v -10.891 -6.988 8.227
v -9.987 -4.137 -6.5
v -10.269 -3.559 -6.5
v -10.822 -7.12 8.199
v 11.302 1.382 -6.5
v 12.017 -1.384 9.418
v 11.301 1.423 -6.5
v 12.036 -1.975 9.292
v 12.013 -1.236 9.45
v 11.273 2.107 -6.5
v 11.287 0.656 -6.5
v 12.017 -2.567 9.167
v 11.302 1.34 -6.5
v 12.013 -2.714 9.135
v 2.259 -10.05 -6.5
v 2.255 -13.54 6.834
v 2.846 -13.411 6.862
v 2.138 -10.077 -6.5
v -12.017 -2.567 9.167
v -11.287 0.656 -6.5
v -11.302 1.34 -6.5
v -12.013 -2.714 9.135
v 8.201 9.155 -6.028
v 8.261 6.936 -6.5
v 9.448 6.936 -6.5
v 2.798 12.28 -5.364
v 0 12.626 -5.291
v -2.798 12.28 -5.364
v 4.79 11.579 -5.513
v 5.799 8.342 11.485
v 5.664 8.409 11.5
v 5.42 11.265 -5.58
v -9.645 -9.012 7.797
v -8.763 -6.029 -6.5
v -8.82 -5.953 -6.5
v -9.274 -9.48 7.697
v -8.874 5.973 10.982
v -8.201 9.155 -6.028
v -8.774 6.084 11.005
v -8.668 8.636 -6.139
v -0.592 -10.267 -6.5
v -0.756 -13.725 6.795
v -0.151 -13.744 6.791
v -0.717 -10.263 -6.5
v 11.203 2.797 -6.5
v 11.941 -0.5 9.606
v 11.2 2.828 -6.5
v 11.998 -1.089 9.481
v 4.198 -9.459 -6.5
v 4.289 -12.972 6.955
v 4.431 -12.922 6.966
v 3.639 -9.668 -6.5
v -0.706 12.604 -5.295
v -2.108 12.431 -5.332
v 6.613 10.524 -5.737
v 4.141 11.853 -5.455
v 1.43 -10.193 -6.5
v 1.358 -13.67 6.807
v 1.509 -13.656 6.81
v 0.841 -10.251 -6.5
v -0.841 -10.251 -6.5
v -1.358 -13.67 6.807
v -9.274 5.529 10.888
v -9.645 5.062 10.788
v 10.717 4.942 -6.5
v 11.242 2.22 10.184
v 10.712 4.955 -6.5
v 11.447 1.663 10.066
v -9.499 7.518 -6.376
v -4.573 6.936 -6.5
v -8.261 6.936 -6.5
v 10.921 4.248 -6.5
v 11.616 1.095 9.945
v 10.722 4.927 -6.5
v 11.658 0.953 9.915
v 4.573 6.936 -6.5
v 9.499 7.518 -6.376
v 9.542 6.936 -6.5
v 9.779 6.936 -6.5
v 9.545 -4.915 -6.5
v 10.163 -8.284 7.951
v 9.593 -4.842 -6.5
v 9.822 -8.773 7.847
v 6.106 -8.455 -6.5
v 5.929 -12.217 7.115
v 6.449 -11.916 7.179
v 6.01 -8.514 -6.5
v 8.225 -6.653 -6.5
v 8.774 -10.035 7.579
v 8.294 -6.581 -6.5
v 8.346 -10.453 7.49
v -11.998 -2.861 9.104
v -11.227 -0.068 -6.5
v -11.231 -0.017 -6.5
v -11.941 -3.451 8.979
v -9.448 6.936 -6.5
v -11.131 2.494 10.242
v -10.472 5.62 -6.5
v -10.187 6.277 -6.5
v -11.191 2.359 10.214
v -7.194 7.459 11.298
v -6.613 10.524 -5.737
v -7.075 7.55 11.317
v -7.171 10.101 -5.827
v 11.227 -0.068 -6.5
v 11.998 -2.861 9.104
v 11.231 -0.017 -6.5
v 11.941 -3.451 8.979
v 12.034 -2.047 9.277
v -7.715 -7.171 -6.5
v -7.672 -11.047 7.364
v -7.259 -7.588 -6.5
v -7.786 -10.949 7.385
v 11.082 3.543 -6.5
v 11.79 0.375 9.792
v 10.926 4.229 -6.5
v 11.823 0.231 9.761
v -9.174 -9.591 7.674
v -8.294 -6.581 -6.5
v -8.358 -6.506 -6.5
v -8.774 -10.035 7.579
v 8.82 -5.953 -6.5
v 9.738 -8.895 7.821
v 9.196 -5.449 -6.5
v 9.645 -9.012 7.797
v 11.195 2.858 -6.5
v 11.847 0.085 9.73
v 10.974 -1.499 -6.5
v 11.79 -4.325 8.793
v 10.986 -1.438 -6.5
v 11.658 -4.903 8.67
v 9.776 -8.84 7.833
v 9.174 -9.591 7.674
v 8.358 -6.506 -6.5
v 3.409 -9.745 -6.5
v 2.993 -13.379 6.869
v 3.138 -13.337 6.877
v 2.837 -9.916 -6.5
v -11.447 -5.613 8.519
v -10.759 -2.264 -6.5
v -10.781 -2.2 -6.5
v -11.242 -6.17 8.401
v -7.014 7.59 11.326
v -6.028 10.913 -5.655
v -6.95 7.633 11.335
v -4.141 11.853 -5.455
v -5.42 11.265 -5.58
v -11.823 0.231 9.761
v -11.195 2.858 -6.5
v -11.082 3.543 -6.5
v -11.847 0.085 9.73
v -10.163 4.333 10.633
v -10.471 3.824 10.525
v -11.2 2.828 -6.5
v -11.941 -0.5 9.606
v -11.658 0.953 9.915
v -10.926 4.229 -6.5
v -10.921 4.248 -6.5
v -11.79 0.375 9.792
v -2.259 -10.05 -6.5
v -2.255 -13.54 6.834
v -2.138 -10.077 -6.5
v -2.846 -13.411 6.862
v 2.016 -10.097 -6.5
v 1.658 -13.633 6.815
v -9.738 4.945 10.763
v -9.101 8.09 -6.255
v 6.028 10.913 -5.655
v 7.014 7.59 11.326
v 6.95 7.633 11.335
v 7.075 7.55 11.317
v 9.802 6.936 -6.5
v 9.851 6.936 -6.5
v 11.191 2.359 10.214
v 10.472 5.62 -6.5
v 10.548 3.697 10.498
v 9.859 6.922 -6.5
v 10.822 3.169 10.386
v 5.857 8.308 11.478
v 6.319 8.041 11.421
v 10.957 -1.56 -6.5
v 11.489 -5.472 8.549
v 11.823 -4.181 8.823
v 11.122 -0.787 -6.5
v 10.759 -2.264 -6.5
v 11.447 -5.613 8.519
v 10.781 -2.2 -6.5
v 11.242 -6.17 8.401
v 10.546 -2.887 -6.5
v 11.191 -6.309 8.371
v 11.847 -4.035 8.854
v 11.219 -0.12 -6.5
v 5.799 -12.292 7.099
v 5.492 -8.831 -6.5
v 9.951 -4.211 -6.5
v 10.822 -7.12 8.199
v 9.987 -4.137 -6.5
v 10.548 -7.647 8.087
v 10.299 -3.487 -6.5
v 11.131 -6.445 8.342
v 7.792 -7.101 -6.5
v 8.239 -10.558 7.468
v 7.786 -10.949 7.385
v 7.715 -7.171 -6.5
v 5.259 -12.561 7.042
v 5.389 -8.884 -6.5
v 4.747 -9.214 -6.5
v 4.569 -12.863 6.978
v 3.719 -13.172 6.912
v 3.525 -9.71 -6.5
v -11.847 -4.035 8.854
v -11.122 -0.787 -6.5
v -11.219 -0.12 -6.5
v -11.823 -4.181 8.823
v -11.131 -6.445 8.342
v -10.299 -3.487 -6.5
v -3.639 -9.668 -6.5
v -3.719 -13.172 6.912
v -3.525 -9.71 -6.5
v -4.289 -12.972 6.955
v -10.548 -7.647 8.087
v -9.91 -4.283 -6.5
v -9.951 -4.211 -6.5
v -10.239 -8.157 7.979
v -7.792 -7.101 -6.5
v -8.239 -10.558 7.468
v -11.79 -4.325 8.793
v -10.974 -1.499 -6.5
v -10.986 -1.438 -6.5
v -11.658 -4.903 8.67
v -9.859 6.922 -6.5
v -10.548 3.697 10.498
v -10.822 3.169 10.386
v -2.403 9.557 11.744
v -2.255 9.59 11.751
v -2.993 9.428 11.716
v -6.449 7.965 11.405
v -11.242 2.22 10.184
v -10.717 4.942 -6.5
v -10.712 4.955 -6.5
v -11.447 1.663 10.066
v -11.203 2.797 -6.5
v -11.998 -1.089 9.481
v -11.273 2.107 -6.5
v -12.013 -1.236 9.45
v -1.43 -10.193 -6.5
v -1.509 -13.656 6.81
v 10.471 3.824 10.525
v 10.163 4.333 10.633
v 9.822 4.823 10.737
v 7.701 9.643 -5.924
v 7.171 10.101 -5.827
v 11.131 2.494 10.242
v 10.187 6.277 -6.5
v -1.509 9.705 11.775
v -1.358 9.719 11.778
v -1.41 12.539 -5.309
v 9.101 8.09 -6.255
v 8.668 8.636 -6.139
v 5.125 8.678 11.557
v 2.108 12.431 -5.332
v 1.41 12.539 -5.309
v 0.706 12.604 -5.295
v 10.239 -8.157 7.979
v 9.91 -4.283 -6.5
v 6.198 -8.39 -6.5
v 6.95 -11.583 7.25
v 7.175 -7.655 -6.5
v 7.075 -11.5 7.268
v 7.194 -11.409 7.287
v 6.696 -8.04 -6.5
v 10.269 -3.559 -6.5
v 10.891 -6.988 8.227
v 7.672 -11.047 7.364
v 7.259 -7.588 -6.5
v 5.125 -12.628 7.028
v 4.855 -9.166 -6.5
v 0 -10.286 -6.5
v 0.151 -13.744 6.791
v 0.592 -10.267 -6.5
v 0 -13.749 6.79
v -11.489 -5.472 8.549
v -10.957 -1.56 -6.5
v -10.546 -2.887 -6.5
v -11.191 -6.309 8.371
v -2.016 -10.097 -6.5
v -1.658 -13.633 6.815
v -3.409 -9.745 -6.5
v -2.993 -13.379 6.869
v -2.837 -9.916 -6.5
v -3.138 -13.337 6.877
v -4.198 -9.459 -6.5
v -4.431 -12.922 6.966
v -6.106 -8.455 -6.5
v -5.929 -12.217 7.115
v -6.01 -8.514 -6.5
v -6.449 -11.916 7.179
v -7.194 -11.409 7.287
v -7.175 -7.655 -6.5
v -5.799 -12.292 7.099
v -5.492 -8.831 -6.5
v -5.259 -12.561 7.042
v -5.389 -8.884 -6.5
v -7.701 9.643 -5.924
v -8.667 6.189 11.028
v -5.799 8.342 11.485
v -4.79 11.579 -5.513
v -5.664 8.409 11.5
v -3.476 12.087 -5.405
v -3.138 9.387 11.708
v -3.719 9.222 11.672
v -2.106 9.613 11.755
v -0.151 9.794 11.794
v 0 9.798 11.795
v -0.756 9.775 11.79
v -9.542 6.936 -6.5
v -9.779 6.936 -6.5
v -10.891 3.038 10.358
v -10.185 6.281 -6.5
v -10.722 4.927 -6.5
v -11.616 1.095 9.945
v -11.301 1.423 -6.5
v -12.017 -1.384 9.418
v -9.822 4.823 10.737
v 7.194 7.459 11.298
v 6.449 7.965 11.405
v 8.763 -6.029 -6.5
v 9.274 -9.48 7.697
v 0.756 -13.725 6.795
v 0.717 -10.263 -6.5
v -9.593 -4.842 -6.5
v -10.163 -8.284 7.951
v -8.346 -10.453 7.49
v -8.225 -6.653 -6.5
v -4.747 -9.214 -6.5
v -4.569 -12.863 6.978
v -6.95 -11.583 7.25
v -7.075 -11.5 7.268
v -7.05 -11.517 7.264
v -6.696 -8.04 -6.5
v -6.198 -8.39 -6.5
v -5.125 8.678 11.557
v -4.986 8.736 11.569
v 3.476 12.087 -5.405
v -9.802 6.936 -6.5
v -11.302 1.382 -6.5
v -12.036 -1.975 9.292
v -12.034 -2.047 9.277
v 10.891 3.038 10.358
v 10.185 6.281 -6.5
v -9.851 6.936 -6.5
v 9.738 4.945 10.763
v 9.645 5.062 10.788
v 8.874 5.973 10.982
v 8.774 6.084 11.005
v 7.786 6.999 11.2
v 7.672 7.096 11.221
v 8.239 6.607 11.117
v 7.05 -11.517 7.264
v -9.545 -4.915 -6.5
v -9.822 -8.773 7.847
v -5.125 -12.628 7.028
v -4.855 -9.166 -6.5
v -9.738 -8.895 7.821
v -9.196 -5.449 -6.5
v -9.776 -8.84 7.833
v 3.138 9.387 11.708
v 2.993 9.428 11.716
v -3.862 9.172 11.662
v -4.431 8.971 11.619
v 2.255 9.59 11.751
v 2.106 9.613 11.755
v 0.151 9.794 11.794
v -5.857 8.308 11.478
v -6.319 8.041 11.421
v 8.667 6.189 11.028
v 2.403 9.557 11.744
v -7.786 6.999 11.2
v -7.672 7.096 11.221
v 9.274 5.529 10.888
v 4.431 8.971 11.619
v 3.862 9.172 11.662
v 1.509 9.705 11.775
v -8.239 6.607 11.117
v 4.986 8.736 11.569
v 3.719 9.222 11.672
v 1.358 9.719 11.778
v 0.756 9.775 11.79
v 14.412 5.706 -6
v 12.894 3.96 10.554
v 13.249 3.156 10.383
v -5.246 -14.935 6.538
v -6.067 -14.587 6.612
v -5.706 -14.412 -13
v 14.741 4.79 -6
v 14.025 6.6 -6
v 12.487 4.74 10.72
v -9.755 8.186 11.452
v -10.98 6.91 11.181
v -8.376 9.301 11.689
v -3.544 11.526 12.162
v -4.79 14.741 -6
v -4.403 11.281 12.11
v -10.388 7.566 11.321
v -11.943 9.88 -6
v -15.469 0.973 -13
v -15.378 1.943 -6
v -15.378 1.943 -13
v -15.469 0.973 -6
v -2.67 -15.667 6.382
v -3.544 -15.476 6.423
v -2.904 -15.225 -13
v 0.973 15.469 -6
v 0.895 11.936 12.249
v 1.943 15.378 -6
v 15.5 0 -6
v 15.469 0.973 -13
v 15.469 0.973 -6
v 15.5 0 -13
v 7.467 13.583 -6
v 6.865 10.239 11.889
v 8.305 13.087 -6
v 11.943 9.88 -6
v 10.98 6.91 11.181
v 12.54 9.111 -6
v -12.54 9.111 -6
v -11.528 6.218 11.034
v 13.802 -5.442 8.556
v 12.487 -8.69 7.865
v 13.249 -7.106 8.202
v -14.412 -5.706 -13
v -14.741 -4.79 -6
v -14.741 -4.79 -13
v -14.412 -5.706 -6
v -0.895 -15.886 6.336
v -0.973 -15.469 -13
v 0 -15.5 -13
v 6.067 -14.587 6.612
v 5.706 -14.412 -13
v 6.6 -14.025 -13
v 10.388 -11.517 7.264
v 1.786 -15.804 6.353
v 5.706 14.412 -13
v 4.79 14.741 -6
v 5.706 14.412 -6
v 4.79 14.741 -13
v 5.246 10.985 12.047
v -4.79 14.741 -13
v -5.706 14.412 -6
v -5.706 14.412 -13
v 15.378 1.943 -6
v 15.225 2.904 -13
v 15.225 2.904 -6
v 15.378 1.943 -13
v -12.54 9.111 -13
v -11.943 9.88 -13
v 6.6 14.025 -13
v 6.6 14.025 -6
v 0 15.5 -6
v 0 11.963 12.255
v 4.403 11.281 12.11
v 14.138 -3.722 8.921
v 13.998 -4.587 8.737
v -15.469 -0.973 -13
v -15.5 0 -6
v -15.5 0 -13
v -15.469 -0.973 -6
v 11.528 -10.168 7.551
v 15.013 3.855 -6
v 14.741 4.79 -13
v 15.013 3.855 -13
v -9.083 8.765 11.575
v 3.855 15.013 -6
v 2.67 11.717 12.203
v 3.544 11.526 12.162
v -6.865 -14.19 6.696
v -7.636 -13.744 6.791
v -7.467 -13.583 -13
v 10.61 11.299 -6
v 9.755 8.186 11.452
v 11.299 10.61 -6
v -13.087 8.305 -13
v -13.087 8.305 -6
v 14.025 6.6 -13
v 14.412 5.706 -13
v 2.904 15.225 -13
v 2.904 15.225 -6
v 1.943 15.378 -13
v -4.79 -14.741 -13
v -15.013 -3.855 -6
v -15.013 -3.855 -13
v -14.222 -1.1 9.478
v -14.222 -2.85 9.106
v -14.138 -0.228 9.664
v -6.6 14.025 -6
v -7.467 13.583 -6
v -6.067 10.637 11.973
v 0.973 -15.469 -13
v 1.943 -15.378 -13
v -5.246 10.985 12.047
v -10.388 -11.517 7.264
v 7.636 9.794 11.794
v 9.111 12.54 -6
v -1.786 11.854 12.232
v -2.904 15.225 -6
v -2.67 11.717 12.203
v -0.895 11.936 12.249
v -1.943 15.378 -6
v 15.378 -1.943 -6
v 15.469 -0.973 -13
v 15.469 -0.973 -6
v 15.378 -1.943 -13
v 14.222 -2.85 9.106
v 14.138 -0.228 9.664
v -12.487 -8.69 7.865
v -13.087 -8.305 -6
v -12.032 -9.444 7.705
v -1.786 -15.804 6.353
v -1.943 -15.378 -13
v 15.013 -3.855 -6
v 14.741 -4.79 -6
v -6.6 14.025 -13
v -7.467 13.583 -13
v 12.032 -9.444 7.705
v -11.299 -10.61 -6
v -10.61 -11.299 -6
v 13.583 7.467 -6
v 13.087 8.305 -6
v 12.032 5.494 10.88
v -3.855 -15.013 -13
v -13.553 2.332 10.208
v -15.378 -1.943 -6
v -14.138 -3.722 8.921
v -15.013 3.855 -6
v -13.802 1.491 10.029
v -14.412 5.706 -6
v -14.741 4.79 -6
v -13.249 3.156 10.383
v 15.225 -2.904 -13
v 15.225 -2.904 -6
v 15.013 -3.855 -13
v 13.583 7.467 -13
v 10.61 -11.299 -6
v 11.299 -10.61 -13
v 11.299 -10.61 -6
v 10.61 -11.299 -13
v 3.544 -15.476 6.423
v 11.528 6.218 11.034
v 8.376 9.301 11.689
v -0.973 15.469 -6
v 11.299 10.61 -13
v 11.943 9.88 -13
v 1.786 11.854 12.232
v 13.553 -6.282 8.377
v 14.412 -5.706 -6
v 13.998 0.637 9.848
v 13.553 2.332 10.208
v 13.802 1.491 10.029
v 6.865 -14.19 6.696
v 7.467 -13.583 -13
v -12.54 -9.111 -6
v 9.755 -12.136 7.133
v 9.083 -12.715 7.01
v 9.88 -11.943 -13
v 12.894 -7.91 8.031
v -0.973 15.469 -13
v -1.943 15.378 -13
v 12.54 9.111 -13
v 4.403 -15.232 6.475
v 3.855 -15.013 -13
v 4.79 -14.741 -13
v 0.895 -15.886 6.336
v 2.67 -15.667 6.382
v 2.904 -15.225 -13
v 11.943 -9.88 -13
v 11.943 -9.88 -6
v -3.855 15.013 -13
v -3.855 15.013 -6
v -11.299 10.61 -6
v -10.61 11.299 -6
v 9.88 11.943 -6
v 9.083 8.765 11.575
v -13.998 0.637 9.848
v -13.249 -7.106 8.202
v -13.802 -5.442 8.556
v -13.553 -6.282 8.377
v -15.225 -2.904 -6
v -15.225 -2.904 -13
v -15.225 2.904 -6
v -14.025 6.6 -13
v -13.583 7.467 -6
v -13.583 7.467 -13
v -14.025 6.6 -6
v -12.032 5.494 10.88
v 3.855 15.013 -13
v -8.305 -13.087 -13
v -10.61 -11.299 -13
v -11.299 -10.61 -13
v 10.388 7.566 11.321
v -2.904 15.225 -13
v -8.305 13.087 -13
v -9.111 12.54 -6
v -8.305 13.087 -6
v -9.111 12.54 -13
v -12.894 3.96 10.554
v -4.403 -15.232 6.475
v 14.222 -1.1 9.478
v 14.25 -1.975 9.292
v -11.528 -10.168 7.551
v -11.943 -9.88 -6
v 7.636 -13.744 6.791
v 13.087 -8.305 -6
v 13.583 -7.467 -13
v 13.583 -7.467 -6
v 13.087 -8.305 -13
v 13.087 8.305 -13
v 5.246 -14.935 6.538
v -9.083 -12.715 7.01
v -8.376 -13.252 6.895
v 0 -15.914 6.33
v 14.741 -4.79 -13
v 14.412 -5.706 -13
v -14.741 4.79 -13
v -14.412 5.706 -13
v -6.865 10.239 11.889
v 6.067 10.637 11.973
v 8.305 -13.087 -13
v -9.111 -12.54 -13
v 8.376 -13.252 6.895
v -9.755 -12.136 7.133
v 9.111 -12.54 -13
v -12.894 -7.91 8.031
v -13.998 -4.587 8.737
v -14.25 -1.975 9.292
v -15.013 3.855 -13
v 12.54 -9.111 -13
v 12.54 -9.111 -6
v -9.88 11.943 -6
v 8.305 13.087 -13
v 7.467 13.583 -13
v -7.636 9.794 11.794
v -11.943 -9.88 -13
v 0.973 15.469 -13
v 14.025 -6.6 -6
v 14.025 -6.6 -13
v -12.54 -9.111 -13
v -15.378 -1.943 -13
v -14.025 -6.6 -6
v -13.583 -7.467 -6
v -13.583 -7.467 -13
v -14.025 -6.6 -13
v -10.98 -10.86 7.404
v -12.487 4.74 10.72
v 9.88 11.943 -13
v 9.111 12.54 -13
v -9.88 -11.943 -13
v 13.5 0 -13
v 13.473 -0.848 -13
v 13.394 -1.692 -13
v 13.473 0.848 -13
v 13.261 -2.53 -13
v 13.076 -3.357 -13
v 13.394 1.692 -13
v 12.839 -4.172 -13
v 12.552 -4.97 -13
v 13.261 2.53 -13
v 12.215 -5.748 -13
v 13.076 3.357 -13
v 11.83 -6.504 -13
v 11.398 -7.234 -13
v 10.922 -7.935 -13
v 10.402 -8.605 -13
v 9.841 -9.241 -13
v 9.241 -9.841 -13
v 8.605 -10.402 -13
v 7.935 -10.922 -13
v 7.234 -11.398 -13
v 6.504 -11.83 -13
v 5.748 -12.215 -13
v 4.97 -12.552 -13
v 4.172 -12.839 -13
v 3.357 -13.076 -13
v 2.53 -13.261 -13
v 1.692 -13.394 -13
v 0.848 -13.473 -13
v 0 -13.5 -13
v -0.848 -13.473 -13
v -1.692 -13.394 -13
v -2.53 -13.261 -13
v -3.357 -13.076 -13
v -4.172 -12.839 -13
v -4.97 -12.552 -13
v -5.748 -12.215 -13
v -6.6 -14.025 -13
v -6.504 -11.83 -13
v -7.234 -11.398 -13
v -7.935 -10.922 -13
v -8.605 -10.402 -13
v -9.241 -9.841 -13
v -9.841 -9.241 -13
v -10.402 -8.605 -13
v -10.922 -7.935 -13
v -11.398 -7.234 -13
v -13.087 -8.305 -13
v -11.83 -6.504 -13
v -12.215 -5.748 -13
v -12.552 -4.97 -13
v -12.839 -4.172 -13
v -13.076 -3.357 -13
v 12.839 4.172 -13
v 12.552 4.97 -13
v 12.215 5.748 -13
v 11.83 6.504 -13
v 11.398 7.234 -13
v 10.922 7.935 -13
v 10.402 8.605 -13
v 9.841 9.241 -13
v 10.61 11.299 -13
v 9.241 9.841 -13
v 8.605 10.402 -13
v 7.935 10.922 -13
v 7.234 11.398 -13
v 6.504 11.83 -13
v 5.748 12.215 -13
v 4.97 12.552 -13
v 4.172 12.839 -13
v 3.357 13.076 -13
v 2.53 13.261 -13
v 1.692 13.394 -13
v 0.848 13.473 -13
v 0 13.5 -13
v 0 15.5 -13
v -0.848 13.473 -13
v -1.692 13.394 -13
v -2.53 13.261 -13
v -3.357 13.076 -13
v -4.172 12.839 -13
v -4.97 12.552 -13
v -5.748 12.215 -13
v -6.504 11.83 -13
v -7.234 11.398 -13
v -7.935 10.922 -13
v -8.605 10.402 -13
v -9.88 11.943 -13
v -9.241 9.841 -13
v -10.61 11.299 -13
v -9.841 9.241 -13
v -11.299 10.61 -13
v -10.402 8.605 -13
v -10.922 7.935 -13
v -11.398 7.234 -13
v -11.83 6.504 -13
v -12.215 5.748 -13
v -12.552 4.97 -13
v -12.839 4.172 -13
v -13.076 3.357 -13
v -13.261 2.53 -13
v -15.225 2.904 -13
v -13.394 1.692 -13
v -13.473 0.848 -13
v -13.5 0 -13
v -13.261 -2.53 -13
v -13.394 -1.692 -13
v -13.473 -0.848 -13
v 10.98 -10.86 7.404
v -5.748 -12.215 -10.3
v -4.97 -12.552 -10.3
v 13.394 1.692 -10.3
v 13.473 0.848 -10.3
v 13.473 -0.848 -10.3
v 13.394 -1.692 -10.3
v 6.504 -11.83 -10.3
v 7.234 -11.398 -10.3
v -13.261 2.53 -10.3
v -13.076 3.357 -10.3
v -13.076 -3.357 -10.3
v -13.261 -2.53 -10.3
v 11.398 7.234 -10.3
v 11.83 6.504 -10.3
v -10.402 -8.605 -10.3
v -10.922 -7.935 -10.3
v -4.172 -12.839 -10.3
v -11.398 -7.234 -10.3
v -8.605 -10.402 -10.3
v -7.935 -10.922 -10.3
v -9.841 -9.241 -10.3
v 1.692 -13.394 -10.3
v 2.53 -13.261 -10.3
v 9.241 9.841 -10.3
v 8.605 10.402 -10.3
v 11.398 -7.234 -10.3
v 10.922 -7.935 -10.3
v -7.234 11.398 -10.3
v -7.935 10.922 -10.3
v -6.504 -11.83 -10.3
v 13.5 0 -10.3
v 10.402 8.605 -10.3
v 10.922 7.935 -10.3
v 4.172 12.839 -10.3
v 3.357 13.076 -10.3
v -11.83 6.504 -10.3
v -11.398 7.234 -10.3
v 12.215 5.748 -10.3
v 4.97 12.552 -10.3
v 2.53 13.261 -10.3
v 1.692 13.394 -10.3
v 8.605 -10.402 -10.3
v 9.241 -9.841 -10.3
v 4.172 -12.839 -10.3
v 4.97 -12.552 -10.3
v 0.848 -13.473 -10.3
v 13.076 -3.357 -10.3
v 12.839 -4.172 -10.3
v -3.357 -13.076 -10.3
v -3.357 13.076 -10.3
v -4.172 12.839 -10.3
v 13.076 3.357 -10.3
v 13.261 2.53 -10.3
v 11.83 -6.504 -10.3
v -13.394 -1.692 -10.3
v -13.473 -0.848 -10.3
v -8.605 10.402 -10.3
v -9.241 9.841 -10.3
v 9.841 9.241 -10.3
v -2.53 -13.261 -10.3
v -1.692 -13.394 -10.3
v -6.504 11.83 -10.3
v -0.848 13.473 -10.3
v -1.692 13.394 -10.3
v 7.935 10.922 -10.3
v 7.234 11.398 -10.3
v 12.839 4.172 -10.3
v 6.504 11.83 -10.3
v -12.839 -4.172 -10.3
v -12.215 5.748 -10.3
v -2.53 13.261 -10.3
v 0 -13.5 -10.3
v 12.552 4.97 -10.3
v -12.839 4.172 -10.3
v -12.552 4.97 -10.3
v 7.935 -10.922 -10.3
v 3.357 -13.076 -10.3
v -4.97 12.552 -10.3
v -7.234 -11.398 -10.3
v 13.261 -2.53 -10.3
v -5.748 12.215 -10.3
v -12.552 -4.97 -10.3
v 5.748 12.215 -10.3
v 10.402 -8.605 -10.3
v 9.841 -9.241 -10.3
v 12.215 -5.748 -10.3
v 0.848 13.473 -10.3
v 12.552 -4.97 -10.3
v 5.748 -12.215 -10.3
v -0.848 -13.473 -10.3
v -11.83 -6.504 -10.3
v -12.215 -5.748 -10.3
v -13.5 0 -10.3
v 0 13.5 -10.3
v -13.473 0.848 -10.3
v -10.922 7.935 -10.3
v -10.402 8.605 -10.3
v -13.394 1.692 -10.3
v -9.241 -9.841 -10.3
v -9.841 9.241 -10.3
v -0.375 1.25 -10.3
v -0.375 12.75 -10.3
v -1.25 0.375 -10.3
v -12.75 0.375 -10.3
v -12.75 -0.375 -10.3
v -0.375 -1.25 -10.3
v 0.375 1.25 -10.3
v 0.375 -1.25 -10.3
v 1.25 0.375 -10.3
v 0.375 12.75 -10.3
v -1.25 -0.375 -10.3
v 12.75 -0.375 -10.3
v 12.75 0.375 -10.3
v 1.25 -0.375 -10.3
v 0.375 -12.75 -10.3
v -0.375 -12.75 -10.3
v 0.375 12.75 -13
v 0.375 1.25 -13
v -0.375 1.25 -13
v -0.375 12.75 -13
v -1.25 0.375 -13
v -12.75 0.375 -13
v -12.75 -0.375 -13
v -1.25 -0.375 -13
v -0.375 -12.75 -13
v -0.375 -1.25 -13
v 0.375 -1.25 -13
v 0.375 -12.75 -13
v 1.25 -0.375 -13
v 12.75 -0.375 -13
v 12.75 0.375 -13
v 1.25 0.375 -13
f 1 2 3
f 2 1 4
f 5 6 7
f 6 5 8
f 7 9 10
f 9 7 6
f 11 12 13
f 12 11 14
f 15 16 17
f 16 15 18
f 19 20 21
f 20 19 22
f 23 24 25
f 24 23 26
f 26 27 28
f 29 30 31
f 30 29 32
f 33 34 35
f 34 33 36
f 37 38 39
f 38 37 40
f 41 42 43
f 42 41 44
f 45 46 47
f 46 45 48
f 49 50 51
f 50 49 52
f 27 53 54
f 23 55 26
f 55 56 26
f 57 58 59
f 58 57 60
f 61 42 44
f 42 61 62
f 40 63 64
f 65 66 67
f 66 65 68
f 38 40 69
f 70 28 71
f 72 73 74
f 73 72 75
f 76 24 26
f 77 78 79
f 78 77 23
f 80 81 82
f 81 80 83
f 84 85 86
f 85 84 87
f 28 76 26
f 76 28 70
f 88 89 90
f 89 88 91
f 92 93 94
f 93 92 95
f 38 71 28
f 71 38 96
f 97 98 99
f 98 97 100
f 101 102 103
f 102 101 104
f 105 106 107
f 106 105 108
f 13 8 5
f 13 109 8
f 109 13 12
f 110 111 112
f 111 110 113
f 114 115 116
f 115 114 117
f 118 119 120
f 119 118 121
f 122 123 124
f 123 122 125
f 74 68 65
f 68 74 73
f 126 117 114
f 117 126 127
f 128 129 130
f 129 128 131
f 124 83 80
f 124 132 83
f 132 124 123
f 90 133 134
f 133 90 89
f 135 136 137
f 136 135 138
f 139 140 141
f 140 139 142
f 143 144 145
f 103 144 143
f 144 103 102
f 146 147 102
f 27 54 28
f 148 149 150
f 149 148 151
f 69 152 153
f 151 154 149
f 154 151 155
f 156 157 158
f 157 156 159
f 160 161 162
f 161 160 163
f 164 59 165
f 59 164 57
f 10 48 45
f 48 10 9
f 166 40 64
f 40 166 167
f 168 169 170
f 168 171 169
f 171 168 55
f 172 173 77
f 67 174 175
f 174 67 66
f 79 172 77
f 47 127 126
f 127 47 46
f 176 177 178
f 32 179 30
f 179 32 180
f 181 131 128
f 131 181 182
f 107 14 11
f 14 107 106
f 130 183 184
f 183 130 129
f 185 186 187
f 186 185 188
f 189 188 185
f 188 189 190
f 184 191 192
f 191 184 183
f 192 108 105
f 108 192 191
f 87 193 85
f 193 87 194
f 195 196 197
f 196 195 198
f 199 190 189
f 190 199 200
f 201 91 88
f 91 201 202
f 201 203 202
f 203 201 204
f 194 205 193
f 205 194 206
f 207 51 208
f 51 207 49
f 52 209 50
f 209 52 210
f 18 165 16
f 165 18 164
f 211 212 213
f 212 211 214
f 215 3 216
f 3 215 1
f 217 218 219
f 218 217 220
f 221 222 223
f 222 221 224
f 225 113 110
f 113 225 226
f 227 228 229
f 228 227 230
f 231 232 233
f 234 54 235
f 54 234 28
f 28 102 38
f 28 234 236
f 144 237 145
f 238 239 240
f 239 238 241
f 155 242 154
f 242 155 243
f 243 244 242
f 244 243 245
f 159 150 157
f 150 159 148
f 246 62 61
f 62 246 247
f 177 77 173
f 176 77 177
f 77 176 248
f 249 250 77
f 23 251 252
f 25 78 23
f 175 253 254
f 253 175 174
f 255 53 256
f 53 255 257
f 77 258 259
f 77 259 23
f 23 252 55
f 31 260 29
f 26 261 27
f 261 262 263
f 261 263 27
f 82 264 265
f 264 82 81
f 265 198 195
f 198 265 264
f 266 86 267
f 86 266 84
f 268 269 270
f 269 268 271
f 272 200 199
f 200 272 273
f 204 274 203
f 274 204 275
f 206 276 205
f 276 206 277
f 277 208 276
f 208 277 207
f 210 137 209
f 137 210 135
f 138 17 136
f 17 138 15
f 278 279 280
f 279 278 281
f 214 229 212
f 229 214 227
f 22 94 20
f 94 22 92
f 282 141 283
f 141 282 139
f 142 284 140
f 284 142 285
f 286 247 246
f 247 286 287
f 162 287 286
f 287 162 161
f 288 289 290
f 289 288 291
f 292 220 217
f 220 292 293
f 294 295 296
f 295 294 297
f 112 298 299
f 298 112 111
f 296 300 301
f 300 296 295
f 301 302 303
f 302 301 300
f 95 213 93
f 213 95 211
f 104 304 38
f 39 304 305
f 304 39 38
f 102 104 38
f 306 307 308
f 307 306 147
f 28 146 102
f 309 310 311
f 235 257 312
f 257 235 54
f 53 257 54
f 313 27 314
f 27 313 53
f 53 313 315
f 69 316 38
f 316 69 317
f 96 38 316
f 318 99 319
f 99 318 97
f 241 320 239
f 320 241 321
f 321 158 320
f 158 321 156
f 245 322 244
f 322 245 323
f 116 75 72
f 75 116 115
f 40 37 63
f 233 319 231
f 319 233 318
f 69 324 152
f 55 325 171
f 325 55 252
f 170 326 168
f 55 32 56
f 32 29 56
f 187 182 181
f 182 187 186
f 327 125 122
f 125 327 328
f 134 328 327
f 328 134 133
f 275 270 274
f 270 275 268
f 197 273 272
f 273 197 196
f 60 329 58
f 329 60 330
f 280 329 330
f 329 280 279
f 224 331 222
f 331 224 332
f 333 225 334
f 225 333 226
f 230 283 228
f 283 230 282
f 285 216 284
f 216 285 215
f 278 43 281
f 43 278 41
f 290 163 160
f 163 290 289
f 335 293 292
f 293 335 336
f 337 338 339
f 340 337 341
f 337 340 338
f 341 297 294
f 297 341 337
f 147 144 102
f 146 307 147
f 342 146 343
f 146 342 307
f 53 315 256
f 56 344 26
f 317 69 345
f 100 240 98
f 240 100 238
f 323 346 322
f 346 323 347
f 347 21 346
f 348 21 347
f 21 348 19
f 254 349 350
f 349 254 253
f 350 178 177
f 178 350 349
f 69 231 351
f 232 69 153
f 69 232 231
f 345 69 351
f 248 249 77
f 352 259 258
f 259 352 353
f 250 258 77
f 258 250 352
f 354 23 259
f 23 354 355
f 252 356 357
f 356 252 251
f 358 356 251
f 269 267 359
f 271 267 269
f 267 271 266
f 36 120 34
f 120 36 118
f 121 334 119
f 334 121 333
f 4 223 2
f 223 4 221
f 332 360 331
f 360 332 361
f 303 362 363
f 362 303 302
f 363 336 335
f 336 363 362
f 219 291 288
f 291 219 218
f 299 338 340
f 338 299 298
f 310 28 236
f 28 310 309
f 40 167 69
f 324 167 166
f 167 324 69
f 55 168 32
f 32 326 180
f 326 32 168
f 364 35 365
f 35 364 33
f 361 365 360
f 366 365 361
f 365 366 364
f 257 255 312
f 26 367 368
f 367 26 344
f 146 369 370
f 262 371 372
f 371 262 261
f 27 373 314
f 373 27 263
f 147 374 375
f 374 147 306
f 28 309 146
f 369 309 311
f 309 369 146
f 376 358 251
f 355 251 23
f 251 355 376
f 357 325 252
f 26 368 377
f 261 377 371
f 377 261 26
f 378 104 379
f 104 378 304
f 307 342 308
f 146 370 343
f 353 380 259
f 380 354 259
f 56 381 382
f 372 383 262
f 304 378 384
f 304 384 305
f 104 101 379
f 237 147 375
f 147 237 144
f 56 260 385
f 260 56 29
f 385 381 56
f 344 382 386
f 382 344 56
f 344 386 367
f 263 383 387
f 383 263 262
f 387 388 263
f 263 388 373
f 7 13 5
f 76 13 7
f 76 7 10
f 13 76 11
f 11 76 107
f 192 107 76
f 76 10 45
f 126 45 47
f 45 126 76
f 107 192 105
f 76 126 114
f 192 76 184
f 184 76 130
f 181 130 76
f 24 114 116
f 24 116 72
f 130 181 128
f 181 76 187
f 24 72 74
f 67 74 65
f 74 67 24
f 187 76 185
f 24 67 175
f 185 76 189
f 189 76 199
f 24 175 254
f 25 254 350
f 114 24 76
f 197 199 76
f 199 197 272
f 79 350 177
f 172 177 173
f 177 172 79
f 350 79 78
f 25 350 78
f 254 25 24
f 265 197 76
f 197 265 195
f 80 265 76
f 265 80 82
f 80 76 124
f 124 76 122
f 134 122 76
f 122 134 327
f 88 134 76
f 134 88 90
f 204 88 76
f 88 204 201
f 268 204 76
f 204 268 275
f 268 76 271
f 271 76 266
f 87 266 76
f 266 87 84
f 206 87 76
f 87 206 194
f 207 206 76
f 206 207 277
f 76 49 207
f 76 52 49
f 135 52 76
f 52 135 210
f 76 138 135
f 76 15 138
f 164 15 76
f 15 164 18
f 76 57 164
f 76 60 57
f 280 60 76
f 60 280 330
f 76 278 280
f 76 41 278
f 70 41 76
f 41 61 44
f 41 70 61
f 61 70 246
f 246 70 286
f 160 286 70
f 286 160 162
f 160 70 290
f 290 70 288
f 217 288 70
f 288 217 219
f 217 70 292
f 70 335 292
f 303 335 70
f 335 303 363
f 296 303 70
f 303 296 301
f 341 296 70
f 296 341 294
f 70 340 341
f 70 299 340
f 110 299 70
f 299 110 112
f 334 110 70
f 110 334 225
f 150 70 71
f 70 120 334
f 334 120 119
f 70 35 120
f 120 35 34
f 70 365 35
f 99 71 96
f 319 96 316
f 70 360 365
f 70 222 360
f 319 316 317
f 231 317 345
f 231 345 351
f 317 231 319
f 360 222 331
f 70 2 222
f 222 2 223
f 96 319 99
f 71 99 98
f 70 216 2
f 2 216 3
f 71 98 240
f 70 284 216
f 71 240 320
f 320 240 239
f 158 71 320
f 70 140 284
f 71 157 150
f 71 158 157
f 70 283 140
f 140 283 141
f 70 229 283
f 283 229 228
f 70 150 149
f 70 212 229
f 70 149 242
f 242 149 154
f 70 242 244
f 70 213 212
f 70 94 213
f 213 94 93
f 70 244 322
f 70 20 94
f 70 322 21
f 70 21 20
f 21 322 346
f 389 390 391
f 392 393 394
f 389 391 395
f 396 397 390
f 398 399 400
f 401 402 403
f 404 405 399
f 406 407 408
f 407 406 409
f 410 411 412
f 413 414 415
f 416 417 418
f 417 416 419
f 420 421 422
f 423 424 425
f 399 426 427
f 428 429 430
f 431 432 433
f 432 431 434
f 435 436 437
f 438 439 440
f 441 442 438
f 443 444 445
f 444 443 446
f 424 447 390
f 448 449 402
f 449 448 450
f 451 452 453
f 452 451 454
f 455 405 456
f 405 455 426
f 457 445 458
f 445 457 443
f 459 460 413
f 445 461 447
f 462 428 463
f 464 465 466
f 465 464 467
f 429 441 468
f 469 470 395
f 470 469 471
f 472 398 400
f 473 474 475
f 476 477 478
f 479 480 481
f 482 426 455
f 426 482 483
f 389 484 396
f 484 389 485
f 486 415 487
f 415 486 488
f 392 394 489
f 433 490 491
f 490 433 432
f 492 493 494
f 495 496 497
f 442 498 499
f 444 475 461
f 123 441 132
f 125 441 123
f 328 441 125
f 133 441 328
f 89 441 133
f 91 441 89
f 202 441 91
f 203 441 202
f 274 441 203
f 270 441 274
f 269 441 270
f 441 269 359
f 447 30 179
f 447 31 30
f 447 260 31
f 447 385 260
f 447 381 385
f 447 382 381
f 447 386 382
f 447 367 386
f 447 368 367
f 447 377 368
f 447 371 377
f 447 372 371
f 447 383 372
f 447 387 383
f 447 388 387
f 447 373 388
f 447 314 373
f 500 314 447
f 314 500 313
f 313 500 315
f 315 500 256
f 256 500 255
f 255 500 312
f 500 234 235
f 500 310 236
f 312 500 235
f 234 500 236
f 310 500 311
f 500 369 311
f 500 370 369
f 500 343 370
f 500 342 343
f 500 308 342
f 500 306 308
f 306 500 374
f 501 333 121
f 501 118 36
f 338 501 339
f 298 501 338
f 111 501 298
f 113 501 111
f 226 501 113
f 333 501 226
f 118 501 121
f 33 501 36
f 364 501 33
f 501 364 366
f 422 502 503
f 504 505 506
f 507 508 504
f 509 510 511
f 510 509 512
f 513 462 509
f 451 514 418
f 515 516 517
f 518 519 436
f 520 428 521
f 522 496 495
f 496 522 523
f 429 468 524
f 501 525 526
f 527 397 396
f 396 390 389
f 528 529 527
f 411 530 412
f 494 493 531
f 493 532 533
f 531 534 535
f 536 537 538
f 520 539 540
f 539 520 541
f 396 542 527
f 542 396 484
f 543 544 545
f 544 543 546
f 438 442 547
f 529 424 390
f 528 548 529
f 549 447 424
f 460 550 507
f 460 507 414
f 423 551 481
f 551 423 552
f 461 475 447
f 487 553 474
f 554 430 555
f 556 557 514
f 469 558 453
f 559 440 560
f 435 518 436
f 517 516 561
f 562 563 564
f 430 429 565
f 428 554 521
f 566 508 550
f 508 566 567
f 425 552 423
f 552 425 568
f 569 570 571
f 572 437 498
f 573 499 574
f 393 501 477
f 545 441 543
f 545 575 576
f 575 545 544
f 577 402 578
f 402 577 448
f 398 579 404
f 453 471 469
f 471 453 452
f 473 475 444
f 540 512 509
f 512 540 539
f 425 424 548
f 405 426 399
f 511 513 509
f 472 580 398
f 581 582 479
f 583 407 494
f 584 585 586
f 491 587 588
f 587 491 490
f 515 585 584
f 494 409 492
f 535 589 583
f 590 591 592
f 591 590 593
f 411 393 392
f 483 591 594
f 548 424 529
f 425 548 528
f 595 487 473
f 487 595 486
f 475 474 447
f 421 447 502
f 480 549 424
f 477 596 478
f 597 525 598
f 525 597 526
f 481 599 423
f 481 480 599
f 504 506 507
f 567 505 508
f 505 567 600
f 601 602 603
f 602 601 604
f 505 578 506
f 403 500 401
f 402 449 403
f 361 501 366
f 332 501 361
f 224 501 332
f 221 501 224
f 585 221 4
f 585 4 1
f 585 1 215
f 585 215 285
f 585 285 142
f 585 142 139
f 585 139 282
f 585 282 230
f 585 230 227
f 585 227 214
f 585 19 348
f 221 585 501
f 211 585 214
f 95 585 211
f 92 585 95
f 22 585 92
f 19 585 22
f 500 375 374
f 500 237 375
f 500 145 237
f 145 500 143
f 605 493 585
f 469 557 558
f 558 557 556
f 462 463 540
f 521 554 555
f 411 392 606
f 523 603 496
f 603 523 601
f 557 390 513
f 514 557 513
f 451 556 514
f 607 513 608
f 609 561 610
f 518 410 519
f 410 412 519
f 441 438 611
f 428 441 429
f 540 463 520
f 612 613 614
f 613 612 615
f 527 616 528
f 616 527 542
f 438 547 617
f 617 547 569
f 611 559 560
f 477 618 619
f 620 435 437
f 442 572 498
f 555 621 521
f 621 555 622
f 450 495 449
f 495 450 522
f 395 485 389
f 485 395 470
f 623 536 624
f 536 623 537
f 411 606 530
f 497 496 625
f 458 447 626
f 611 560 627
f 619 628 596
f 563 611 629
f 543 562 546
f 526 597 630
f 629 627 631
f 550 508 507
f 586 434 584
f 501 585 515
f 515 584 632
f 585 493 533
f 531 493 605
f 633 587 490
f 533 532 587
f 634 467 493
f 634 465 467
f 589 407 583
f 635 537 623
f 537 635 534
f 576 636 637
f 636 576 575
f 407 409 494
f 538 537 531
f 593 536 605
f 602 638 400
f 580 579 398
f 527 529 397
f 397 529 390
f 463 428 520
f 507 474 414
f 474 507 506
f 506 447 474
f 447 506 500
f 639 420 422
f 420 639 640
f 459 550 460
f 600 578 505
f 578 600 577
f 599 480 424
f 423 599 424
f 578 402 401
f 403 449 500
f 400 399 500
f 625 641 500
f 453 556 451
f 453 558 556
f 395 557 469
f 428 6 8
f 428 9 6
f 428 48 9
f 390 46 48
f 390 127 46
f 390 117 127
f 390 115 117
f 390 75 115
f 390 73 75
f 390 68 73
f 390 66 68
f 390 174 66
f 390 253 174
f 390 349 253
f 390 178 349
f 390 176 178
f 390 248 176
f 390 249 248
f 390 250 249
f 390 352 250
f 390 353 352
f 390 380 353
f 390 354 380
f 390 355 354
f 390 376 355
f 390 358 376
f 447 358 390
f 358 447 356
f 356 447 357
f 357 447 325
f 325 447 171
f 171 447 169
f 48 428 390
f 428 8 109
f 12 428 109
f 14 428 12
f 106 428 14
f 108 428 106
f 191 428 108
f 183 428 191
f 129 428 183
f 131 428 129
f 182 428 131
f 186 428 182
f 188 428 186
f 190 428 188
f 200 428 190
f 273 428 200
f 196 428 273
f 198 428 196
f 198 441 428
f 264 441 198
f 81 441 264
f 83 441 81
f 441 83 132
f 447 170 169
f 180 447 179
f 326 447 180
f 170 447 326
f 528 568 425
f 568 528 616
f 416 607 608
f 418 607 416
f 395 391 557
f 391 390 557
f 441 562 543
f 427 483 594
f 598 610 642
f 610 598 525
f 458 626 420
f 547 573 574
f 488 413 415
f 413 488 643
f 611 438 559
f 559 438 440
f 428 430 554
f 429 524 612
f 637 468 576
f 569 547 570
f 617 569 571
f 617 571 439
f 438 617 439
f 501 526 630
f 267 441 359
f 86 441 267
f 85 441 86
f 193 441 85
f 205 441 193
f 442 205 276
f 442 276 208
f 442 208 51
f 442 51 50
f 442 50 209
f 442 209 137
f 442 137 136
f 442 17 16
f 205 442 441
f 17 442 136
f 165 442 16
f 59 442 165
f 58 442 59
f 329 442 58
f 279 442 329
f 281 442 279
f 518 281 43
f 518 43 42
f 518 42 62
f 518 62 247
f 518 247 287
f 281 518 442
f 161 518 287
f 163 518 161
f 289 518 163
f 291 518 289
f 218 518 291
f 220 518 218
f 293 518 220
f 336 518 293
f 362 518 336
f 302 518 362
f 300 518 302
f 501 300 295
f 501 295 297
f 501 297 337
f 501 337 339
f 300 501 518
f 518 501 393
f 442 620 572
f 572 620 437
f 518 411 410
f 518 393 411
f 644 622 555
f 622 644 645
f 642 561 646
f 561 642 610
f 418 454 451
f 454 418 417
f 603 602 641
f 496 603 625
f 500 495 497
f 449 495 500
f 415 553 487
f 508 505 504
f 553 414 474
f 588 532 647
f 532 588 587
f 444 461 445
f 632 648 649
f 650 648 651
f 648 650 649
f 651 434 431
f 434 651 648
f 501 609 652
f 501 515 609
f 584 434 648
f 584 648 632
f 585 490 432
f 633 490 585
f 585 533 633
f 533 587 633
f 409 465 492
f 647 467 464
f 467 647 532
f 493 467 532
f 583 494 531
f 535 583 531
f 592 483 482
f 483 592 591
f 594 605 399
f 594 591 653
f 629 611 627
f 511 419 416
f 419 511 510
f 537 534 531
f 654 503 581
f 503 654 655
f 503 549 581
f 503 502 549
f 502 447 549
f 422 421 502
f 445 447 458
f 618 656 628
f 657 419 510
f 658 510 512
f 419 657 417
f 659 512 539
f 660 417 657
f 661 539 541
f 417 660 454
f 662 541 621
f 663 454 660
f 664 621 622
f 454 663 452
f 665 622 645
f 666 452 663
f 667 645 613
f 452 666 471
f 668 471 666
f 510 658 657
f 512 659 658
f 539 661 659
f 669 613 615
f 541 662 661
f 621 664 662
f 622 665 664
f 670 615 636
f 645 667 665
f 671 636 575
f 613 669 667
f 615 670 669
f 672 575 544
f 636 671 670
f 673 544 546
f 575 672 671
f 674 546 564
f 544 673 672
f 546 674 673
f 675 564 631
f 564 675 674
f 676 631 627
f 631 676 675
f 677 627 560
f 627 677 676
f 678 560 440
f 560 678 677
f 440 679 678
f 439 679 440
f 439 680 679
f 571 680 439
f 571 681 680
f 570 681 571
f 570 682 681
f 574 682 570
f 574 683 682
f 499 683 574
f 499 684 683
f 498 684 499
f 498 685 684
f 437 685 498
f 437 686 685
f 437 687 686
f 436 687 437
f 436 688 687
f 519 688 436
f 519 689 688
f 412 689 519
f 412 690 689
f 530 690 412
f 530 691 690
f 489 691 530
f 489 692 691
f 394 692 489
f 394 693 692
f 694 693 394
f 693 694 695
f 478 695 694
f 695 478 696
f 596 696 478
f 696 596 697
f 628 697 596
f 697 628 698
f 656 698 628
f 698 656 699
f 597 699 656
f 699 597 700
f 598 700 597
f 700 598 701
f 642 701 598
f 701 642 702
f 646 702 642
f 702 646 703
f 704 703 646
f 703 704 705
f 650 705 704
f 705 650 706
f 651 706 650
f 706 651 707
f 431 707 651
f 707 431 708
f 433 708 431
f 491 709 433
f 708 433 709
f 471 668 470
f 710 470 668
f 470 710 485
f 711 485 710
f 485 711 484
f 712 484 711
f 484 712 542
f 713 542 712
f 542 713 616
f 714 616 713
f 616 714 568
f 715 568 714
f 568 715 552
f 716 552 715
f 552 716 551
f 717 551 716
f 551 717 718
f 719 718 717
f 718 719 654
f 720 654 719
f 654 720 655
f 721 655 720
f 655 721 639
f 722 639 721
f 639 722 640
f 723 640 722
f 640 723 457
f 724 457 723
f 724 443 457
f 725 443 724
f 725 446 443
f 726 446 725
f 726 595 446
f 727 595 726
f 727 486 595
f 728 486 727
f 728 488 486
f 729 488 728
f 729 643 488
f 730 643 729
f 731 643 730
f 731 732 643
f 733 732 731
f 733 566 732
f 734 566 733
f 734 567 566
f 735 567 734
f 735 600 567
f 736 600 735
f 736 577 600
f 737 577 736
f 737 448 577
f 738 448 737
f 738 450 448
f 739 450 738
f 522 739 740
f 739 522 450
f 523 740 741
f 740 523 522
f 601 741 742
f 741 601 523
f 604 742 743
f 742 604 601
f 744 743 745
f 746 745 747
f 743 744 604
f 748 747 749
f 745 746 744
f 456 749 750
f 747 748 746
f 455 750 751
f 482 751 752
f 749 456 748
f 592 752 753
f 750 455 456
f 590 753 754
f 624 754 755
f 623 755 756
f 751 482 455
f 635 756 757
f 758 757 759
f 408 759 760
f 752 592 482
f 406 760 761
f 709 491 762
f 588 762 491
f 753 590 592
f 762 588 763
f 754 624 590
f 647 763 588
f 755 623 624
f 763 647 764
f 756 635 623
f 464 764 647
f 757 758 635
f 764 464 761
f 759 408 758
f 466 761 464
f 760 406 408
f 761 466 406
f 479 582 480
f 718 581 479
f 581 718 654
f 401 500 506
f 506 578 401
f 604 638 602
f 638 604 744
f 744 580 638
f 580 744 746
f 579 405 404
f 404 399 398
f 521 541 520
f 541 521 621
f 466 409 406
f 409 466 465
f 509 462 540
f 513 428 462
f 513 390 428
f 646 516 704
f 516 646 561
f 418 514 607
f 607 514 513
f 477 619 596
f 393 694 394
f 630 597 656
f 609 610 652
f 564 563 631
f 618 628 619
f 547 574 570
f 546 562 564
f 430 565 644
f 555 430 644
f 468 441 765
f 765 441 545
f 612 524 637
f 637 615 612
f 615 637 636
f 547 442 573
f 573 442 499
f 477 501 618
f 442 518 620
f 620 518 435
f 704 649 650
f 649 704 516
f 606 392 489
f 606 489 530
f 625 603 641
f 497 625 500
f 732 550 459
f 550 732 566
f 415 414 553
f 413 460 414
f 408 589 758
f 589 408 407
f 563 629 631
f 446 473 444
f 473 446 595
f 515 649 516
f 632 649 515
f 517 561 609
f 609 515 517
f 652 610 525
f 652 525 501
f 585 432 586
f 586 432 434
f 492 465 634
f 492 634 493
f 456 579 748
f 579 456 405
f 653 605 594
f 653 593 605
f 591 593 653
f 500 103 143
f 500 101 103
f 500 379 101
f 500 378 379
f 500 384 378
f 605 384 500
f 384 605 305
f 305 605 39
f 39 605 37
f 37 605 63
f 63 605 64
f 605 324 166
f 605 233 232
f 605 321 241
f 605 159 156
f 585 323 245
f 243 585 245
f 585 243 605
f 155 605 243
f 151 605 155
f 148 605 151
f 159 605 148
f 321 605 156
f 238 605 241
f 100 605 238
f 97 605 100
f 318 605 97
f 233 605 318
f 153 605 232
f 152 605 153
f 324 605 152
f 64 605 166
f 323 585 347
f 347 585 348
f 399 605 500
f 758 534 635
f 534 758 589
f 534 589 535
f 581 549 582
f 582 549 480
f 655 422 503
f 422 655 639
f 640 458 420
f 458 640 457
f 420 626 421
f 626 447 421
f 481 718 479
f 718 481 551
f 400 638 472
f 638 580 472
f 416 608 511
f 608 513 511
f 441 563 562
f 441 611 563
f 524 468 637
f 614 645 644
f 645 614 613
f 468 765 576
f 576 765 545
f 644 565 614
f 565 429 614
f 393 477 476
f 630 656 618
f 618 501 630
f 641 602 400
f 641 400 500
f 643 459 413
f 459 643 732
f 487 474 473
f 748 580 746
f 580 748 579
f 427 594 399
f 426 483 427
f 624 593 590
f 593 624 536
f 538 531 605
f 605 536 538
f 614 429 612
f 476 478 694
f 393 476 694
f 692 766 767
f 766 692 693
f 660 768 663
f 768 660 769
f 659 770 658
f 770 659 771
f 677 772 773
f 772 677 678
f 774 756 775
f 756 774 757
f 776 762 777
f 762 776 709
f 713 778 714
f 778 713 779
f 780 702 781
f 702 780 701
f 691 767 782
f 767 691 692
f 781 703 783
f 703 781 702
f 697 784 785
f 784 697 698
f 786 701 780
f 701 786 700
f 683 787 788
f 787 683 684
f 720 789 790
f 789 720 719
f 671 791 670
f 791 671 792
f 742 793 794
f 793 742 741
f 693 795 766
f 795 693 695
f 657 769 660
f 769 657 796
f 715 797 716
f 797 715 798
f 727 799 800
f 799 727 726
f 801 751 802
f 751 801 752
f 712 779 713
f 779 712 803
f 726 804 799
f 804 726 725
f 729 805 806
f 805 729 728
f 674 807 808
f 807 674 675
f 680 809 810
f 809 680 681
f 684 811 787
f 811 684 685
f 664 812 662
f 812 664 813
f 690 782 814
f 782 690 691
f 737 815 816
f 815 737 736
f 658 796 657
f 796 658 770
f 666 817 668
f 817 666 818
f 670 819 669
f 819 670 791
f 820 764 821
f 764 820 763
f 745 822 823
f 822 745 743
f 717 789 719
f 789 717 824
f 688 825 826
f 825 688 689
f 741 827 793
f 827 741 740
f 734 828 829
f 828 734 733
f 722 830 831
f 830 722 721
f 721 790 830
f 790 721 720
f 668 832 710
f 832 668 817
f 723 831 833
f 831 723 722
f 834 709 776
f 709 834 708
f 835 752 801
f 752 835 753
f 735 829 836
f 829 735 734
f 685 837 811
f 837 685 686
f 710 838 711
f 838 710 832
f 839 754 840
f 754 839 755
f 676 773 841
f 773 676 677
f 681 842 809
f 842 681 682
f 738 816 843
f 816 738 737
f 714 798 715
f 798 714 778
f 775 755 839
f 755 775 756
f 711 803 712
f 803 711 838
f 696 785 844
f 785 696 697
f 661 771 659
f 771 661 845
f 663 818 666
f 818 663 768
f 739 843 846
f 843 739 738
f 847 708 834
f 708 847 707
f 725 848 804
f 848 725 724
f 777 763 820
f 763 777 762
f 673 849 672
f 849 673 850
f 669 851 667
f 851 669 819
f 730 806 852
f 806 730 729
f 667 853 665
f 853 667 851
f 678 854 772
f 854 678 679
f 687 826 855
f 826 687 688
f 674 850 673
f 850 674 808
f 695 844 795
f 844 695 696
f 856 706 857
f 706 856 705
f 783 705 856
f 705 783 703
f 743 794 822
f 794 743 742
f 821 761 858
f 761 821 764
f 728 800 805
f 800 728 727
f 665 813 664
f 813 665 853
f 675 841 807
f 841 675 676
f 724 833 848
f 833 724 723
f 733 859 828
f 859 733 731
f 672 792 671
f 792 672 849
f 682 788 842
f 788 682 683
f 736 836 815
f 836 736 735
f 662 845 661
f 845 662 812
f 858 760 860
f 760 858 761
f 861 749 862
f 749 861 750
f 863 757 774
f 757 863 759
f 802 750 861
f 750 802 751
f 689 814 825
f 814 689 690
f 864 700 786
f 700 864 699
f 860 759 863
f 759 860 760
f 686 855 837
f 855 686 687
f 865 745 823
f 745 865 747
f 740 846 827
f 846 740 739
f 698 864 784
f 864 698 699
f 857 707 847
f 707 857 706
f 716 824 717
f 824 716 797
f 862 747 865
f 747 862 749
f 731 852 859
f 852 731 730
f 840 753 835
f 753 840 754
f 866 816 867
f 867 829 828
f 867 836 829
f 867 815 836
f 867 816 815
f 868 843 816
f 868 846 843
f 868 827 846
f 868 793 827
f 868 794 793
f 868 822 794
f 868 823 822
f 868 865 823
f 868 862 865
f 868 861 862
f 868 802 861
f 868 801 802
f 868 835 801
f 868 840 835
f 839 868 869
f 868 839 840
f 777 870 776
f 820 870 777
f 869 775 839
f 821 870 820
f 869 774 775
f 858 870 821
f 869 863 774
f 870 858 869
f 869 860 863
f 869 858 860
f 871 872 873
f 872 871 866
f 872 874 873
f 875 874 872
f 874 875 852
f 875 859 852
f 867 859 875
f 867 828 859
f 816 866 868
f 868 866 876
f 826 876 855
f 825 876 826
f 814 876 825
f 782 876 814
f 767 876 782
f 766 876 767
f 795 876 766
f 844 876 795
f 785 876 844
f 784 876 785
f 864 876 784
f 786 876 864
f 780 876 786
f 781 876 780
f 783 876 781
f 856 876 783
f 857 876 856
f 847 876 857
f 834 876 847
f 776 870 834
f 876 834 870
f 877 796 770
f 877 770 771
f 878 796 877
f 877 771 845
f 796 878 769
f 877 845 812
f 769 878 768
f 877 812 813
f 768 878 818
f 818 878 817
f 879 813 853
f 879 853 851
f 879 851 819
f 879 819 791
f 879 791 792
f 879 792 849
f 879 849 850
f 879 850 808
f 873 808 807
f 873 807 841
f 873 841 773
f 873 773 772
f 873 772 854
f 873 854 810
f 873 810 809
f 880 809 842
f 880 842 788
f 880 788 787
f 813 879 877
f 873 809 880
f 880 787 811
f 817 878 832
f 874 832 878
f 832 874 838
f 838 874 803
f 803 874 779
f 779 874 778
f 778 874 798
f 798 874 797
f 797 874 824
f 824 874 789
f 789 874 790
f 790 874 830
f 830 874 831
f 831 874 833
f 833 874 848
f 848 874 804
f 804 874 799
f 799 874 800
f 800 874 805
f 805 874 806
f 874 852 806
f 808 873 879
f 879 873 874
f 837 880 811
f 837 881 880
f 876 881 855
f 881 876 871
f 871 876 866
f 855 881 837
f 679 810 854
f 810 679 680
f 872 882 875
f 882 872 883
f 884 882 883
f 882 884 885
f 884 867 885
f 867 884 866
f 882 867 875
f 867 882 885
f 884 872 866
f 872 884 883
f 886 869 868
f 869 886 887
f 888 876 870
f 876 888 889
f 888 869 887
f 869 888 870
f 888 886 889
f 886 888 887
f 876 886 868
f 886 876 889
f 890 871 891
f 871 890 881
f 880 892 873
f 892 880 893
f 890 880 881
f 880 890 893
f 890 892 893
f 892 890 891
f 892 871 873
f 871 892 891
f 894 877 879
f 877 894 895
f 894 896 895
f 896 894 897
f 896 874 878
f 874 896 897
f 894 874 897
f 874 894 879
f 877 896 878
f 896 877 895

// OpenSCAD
//
// Kitchen Chair footpad that holds a 1" diameter felt pad
// Keeps the pad from sliding off by providing a small lip
//

Quality = 100; // [25:Draft,100:Production]

// mm
Leg_Bottom_Diameter = 22.5; // [15:50]

// mm
Leg_Top_Diameter = 24.5; // [15:50]

//degrees
Leg_Angle = 12; // [0:20]

// mm
Leg_Cup_Height = 13; // [10:30]

// mm
Felt_Diameter = 27; // [15:52]

// mm
Felt_Height = 5; // [3:10]

// put thin break-away supports under the felt cup
Include_Supports = 1; // [1:Yes,0:No]

// BELOW HERE VARIABLES THAT ARE NOT CUSTOMIZABLE

$fn = Quality;
wall = 2*1;

// Create the thing

union() {
	difference() {
		hull() {
			rotate([Leg_Angle,0,0]) {
				cylinder(r1=Leg_Bottom_Diameter/2+wall, 
						r2=Leg_Top_Diameter/2+wall, 
						h=Leg_Cup_Height+3*wall,
						center=true);
			}
		
			// felt holder
			translate([0,0,-(Leg_Cup_Height+3*wall)/2]) {
				cylinder(r=Felt_Diameter/2 + wall, 
					h=Felt_Height+wall, 
					center=true);
			}
		
		}
	
		// carve out holes for leg and felt
		difference() {
		   rotate([Leg_Angle,0,0])
				translate([0,0,1.6*wall])
					cylinder(r1=Leg_Bottom_Diameter/2, 
						r2=Leg_Top_Diameter/2, 
						h=Leg_Cup_Height+Felt_Height+2*wall,
						center=true);
			translate([0,0,-(5+Leg_Cup_Height+Felt_Height+0*wall)/2])
				cube([200,200,10],center=true);
		}
	
		translate([0,0,-(0.1+Leg_Cup_Height+Felt_Height+3*wall)/2])
			cylinder(r=Felt_Diameter/2, 
				h=Felt_Height/2+1, 
				center=true);
	
	}

	if (Include_Supports) {
		// add in break-away supports under the felt cup, the bridge is
		// a little too far.
	
		for (rot = [0:90:359])
			rotate([0,0,rot])
				translate([0,Felt_Height+wall,-(Leg_Cup_Height+Felt_Height+3*wall-Felt_Height/2+1)/2])
					cube([0.75, Felt_Diameter/2-wall, Felt_Height/2+1], center=true);
	}

}
